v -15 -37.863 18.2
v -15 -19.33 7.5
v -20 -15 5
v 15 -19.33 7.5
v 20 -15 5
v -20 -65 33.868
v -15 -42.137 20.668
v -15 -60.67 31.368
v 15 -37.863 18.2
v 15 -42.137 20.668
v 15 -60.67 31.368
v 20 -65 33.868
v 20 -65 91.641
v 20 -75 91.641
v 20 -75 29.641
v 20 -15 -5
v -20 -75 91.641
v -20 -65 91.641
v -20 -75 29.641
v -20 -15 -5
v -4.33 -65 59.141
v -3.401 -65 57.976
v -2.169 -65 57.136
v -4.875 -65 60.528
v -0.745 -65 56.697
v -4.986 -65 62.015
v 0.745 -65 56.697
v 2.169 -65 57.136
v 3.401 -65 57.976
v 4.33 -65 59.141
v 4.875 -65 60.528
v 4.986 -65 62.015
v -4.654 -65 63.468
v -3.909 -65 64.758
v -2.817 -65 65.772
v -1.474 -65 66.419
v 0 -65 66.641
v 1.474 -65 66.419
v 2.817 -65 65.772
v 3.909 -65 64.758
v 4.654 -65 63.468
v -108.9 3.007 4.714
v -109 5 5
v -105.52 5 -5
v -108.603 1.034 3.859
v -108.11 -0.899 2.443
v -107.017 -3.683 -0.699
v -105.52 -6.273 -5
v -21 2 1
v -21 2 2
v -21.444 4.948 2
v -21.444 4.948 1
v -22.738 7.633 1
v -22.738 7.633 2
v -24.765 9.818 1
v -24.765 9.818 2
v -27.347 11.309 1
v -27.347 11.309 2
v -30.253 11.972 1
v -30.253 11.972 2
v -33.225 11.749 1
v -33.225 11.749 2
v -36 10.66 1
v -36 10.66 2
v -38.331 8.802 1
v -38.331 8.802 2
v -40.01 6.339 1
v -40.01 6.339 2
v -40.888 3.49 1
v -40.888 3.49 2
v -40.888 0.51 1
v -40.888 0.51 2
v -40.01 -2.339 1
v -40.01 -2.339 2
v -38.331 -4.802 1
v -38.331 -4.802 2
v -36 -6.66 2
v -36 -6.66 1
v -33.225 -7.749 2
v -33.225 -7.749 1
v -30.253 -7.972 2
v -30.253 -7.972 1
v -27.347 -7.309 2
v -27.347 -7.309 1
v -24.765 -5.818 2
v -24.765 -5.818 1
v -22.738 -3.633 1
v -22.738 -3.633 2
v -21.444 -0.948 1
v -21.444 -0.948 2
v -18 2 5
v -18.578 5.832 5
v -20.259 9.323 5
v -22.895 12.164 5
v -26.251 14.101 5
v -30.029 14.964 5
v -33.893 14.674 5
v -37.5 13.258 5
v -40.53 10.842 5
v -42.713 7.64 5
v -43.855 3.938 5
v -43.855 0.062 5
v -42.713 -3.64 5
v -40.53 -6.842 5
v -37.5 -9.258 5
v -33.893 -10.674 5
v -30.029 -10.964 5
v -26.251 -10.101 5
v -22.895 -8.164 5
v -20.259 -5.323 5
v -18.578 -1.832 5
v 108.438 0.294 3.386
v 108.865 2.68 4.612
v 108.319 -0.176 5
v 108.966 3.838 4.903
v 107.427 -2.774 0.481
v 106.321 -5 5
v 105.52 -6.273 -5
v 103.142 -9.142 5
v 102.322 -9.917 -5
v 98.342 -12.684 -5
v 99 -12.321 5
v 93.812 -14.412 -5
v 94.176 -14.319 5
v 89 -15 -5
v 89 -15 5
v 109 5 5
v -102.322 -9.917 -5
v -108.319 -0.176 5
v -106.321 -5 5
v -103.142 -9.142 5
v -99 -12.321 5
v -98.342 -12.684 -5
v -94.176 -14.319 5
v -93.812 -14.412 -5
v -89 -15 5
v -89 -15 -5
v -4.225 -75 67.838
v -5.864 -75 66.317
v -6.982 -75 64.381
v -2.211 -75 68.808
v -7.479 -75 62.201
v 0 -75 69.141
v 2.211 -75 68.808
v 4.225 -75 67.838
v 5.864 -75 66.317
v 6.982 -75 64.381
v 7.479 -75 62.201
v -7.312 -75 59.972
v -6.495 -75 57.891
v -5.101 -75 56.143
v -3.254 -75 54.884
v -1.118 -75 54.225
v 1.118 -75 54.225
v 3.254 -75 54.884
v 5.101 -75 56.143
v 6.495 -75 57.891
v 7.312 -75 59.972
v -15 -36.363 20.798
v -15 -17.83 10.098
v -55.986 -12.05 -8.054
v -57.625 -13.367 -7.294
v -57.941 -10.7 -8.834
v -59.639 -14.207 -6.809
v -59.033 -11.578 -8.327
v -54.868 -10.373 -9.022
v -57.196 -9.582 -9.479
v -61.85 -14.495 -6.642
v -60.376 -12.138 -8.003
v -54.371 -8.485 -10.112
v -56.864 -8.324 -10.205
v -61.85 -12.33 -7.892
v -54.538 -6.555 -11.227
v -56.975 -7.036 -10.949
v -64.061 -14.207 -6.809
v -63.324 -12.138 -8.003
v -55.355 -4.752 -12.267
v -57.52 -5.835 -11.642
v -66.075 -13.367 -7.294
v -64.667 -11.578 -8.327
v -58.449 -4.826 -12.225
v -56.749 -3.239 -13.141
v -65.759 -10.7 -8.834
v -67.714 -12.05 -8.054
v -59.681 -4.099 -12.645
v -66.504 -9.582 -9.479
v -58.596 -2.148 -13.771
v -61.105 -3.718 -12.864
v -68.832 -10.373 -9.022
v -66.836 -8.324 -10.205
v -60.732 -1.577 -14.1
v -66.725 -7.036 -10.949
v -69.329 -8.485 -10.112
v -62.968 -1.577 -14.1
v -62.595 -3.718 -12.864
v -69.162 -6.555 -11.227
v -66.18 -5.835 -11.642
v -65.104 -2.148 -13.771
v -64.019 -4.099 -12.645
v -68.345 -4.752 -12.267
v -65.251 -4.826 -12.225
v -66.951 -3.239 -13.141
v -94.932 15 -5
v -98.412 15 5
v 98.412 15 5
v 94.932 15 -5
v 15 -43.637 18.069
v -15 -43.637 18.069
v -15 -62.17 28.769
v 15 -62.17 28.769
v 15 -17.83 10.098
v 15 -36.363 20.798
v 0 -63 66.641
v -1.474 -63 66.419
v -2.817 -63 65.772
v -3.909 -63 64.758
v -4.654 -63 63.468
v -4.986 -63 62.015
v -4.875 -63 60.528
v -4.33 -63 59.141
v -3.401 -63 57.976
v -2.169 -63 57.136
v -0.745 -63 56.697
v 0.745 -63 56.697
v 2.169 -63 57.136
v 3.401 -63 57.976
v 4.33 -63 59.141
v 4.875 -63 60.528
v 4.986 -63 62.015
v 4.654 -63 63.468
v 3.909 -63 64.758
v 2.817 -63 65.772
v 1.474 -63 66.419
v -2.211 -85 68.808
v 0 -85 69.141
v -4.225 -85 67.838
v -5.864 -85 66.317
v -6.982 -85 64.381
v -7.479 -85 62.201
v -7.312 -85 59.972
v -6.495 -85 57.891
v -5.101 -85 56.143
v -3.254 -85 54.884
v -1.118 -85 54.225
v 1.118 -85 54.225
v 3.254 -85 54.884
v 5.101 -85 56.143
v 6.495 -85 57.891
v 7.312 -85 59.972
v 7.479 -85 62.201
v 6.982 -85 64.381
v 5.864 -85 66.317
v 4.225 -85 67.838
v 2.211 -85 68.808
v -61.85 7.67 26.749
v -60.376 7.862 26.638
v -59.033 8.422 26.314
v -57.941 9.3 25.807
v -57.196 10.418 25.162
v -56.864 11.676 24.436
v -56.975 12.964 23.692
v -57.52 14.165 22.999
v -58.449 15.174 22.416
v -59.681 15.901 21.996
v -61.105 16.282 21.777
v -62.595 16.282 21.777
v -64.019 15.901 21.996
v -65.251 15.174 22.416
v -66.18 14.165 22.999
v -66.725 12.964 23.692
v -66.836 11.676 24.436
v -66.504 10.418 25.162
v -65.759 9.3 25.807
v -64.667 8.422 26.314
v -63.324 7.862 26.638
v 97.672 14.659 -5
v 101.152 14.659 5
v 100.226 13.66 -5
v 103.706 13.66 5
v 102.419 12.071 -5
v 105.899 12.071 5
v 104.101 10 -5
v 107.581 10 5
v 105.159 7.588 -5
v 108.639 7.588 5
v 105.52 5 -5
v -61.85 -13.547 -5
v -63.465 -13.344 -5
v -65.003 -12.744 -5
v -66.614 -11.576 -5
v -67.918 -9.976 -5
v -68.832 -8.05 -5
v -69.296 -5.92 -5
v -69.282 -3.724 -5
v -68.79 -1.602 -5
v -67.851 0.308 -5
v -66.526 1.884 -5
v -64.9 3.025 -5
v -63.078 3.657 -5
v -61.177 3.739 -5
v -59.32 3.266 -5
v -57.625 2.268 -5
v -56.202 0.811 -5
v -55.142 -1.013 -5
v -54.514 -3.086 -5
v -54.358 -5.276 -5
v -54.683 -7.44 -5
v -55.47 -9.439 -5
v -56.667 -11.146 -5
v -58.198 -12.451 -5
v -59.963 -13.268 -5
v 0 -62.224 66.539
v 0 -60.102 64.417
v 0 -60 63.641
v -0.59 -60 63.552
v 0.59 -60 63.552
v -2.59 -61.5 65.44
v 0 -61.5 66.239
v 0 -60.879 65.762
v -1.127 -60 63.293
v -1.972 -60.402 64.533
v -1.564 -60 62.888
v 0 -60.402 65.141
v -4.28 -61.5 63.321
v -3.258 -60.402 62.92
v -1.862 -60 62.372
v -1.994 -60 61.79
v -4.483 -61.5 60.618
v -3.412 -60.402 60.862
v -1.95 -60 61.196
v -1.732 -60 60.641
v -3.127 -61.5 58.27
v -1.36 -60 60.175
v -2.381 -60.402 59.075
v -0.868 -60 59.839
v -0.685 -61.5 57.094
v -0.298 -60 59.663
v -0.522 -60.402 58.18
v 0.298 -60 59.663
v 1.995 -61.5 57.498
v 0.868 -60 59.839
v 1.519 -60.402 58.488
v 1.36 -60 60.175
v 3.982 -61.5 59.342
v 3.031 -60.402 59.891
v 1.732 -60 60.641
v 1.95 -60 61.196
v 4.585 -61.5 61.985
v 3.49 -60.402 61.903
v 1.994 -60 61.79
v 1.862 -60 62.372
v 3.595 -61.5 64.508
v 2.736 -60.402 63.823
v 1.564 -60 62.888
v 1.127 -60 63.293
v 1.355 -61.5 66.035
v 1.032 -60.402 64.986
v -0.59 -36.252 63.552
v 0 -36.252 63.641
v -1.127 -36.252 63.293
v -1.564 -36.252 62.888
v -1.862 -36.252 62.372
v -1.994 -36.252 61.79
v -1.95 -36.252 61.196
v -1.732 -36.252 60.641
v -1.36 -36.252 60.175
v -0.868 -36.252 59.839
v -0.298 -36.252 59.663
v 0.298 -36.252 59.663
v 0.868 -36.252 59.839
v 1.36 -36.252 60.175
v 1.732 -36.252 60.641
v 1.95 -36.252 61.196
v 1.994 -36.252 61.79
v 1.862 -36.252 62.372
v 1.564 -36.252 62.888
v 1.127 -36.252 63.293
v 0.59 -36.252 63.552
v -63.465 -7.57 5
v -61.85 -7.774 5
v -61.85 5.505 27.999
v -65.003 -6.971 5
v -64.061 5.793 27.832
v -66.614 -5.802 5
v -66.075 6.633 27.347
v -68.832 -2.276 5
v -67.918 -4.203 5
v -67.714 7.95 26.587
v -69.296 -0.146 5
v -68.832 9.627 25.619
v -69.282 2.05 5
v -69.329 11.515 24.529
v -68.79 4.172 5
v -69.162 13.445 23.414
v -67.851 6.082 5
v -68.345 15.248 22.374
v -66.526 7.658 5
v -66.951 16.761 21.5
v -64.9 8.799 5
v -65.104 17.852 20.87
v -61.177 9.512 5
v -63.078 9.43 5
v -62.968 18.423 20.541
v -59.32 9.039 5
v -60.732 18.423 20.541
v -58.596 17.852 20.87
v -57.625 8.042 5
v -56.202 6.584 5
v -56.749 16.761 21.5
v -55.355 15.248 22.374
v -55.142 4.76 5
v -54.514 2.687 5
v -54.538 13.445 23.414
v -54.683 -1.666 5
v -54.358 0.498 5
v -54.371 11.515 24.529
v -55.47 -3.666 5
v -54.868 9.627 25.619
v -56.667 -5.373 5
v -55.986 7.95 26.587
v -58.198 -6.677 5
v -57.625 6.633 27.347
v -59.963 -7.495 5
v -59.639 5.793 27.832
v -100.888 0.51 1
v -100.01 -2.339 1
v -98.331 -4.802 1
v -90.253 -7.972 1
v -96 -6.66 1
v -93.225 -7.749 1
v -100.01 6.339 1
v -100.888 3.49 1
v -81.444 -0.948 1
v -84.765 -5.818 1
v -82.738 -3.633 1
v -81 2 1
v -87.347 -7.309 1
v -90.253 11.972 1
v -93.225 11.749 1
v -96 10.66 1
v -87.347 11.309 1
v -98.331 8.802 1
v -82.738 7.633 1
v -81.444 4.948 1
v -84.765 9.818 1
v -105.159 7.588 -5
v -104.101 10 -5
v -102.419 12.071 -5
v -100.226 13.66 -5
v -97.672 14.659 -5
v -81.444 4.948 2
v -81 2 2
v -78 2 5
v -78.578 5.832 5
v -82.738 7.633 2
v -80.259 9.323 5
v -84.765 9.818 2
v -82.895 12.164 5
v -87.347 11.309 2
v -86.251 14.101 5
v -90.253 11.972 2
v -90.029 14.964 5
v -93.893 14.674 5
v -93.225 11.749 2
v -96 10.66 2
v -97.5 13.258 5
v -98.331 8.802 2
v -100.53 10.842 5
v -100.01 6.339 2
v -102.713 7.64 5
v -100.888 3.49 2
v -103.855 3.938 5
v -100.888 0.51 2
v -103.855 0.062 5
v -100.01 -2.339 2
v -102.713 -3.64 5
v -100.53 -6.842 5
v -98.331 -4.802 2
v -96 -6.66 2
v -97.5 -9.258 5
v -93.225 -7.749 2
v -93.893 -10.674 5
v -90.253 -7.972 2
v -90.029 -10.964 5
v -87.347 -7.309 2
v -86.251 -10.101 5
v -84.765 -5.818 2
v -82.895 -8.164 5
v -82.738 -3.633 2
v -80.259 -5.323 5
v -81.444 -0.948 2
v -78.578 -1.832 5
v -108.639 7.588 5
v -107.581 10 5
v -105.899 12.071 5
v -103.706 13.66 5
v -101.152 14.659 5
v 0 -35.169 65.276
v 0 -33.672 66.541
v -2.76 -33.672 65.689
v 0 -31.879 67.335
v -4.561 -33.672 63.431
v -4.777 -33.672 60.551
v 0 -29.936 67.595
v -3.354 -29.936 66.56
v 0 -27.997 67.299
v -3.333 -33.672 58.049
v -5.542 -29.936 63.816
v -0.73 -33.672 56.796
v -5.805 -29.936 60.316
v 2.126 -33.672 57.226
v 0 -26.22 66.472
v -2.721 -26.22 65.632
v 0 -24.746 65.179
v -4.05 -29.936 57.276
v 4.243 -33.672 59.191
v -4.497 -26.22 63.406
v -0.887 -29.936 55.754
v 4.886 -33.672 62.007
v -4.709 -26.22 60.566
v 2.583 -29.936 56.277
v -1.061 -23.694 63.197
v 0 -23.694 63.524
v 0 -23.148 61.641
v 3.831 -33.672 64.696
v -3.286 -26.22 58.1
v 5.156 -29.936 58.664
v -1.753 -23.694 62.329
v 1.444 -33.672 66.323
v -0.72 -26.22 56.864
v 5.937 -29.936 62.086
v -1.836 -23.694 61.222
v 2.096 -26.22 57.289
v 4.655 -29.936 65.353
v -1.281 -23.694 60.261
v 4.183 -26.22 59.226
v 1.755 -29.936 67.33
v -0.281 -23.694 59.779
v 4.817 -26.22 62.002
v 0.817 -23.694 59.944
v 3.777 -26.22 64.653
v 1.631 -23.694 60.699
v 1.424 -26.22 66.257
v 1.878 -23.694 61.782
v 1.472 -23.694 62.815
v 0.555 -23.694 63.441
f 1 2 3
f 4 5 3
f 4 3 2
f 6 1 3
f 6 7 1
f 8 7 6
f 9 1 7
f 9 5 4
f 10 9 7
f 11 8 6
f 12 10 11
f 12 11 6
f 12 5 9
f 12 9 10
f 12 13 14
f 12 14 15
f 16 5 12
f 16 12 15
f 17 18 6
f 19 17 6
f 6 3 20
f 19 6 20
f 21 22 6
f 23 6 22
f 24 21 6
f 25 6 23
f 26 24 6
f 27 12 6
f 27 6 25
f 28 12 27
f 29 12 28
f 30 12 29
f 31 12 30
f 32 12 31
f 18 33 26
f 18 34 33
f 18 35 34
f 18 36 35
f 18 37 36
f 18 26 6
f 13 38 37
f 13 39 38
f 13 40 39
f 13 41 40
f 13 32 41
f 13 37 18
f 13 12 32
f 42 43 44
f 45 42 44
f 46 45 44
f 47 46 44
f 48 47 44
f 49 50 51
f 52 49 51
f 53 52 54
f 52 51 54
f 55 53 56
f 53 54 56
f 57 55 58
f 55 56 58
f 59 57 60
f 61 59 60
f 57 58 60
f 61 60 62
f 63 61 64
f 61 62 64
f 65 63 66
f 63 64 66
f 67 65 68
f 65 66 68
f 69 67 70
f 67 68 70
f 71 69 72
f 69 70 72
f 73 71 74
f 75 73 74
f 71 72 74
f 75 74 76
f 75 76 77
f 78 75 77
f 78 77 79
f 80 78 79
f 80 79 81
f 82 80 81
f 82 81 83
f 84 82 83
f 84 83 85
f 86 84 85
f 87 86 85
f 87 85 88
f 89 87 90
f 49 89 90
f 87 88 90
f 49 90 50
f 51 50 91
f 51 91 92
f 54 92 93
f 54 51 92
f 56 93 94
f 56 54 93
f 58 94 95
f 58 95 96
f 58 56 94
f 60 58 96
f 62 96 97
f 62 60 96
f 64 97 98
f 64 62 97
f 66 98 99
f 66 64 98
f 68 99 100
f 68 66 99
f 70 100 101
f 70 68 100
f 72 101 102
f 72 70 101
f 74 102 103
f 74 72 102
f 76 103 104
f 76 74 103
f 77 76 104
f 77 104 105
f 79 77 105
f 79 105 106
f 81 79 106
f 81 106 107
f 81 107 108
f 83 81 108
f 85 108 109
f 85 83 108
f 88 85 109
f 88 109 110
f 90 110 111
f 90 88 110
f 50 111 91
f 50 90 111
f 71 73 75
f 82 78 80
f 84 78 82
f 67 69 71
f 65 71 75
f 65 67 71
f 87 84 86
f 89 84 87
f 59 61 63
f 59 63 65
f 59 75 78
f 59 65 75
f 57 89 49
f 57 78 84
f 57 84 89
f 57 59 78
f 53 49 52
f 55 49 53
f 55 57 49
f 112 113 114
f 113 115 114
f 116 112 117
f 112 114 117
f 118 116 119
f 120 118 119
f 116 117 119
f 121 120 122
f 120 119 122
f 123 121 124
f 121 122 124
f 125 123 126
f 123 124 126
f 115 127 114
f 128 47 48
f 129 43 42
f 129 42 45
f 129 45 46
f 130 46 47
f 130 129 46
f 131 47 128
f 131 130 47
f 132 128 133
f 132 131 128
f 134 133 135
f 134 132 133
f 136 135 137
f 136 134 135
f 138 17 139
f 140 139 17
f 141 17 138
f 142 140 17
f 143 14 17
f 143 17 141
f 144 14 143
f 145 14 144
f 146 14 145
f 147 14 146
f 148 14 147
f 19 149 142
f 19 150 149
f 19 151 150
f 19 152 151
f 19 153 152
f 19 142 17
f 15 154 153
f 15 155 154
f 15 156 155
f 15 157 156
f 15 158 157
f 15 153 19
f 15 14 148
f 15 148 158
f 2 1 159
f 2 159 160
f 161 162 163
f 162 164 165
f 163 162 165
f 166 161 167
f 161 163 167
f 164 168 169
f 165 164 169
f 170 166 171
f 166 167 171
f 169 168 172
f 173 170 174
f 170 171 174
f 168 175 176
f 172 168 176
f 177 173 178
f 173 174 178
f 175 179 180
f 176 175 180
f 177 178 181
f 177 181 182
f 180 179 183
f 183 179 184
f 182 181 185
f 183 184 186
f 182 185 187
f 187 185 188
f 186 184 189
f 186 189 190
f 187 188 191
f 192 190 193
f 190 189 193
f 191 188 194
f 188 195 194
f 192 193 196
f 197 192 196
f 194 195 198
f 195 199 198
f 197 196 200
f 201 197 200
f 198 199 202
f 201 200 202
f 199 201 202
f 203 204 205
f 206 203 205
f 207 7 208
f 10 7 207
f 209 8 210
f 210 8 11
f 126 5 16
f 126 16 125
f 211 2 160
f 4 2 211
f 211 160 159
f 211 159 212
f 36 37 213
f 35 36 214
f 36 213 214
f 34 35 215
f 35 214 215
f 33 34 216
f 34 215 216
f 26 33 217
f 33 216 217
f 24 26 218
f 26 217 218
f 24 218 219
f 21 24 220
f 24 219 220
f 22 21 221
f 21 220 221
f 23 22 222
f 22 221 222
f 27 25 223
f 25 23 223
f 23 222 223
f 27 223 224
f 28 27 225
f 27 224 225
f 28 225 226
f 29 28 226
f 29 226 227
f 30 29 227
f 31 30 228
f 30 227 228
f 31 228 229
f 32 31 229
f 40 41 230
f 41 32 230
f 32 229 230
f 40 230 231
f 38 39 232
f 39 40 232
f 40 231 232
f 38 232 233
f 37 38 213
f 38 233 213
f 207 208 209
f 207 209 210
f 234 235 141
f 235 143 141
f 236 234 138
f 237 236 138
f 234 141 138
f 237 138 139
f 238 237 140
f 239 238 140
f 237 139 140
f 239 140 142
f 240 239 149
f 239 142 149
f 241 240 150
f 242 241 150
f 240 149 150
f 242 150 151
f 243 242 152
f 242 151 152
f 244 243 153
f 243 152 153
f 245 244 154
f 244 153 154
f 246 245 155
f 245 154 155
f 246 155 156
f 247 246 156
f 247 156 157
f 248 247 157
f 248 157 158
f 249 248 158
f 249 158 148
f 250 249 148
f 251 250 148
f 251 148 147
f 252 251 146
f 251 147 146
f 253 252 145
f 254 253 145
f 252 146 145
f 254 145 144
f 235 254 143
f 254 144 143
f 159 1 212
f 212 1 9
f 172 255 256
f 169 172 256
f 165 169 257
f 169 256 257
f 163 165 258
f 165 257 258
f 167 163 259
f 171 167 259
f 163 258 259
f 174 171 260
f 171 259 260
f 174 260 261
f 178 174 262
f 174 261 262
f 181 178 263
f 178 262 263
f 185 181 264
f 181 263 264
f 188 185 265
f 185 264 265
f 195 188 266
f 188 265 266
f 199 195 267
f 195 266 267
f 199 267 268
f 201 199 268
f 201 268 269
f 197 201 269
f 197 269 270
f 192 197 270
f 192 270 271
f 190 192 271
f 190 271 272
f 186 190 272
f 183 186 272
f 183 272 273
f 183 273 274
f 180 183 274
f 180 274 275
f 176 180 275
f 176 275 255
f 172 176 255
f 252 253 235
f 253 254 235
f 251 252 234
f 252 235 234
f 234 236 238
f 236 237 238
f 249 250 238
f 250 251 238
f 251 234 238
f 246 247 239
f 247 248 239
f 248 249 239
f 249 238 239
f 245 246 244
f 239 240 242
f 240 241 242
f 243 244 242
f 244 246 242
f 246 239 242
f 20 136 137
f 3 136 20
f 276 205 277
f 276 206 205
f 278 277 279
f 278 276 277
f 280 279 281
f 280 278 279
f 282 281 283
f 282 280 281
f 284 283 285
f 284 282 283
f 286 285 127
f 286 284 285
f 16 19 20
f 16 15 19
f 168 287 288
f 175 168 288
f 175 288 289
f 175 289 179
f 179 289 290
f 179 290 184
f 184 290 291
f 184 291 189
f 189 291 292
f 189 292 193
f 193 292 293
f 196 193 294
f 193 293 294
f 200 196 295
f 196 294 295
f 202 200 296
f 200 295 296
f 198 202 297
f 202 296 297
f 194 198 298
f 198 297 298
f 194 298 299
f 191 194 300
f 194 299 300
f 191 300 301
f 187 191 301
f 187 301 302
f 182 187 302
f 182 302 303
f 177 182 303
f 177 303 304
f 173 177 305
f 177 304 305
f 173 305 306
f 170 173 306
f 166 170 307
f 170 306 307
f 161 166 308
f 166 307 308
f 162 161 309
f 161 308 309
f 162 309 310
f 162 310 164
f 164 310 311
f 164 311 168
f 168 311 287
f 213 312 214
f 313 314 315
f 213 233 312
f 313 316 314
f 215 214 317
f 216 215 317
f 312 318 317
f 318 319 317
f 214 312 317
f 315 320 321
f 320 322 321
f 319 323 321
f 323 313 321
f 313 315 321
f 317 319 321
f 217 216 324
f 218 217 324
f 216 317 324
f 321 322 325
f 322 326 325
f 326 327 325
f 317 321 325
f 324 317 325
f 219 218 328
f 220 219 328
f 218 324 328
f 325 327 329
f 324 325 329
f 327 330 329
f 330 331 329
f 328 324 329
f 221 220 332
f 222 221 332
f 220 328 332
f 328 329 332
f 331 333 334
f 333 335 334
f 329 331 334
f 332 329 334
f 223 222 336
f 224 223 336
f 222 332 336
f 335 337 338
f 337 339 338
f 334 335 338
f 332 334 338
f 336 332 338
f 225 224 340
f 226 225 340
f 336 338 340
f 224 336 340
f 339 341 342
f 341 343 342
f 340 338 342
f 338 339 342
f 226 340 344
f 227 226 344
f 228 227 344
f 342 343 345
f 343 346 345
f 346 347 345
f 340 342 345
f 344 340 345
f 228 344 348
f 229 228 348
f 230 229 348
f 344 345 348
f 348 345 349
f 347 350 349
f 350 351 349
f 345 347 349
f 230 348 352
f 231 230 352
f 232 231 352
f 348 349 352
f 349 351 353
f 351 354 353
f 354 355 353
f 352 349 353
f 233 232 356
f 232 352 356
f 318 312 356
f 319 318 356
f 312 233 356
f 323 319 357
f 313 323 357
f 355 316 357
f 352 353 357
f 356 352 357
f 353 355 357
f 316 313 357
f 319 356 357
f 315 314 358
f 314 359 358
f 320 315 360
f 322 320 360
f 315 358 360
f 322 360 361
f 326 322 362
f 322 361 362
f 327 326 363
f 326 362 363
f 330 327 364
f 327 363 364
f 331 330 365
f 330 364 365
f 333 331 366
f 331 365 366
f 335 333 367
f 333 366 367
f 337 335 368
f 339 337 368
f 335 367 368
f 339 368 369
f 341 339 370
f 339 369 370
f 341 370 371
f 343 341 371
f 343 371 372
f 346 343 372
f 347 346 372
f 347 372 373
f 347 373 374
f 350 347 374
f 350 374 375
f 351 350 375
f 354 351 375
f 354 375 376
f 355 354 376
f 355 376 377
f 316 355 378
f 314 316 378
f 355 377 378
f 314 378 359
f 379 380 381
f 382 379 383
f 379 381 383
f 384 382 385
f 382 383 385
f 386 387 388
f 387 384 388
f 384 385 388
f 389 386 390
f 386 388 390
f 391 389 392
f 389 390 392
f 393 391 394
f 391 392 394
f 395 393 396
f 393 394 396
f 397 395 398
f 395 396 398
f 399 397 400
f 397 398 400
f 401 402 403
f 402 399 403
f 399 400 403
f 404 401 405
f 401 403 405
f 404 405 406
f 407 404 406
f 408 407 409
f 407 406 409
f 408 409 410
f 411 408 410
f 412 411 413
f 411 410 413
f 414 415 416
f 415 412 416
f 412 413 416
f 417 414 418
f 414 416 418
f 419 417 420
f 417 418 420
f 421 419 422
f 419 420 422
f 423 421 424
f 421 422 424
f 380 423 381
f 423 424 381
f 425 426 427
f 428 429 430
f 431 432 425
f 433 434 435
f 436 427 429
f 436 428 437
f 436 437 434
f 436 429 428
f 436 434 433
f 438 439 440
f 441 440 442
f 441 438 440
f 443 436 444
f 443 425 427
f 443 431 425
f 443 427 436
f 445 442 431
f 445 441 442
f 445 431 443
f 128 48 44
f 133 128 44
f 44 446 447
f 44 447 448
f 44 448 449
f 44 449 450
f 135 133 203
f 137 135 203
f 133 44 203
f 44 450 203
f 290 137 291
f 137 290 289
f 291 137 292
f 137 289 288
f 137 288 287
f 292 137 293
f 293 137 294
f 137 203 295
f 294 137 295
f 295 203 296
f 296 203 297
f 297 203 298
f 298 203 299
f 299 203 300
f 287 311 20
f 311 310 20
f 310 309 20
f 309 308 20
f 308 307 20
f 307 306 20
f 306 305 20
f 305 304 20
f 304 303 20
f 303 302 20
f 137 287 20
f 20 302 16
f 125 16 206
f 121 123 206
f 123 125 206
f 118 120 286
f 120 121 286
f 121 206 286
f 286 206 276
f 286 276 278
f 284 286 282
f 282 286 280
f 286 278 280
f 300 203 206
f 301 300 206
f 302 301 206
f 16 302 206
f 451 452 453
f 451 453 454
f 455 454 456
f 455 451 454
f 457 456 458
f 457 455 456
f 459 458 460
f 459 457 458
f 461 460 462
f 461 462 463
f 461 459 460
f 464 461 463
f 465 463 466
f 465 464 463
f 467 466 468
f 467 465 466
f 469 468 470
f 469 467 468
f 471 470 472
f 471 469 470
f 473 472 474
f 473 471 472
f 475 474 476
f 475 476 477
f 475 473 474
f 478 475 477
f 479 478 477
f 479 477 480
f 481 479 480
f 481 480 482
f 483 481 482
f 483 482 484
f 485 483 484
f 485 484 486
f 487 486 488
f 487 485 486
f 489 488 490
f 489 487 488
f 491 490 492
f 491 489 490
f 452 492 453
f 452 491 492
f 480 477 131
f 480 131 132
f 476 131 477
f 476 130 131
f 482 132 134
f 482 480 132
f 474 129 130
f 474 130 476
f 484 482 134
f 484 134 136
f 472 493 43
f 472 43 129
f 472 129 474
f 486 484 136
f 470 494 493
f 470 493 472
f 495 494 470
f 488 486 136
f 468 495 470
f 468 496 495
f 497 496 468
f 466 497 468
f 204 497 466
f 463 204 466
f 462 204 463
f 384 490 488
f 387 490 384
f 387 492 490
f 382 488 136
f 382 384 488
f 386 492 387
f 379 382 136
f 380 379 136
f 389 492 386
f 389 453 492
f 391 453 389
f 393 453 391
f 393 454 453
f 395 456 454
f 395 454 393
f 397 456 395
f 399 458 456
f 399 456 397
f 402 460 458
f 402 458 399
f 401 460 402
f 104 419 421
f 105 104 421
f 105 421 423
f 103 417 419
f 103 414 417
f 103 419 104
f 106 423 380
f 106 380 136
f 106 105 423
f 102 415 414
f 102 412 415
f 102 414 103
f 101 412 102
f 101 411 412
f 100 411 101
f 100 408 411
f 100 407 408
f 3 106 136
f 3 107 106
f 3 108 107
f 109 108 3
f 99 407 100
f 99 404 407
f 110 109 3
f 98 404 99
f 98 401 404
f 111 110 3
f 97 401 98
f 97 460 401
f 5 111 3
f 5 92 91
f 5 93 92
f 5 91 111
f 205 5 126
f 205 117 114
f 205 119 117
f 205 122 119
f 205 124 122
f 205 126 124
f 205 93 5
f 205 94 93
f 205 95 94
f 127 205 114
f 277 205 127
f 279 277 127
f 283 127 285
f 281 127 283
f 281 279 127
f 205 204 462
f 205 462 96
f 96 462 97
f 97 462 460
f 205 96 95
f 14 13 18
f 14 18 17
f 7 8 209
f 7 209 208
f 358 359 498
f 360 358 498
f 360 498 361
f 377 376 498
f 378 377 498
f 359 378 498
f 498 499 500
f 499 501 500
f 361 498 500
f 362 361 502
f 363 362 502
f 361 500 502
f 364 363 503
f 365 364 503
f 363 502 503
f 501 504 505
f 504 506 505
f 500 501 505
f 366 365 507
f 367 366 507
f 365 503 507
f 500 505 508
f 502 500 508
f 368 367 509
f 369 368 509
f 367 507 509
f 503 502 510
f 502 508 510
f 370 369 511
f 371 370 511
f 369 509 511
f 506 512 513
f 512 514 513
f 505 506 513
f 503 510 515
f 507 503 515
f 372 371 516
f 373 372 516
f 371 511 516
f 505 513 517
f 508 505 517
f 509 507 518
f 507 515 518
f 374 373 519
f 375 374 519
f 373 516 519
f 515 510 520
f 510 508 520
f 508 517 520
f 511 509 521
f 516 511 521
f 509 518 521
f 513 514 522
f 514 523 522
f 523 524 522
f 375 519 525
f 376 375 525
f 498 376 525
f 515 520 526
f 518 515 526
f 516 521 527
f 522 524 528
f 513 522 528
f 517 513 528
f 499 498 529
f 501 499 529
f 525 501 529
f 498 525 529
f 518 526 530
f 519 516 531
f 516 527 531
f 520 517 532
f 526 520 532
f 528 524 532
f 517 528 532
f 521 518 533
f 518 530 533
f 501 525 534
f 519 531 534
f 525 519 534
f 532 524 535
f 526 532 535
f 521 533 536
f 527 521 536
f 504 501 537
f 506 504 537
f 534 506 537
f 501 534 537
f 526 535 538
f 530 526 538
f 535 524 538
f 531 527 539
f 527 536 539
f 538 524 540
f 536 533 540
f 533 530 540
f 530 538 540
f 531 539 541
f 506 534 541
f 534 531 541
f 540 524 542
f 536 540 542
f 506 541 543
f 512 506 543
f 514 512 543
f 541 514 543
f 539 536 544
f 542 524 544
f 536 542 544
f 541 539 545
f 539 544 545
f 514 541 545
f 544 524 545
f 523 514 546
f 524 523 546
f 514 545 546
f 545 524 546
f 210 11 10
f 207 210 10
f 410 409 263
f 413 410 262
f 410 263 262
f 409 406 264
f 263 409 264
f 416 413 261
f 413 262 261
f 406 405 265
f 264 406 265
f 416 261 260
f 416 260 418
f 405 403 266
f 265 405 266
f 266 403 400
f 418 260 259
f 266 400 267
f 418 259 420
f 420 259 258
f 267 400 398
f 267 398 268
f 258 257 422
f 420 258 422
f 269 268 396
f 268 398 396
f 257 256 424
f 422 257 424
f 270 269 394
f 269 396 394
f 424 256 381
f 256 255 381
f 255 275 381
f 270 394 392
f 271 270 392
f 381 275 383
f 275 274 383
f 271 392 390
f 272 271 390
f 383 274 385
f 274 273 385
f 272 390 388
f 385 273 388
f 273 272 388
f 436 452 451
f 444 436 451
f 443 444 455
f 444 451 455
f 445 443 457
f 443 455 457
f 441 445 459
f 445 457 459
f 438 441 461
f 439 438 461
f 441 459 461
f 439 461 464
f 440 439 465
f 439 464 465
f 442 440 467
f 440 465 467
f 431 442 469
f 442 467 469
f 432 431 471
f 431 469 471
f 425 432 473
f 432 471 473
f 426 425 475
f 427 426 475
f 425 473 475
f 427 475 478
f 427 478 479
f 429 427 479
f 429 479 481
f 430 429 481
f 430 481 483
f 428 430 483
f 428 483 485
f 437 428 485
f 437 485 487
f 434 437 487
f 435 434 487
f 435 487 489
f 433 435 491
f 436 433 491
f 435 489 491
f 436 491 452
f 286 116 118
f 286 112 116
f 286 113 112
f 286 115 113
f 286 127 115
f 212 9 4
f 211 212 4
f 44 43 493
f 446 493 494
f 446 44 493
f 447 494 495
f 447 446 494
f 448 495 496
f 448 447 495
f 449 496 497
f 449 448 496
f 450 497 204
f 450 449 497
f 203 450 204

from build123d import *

# Parameters (mm, degrees)
IZIM1_W                     = 218
IZIM1_H                     = 30
Y_KSEKLIK_EKSTR_ZYON1_DEPTH = 5
RADYUS1_R                   = 20
IZIM3_R                     = 10
KES_EKSTR_ZYON1_DEPTH       = 4
PAH1_SIZE                   = 3
IZIM5_R                     = 5
KES_EKSTR_ZYON3_DEPTH       = 119.749210232
Y_KSEKLIK_EKSTR_ZYON2_DEPTH = 20
IZIM9_W                     = 30
IZIM9_H                     = 21.4
Y_KSEKLIK_EKSTR_ZYON3_DEPTH = 3
IZIM9_3_W                   = 30
IZIM9_3_H                   = 21.4
KES_EKSTR_ZYON4_DEPTH       = 3
KES_EKSTR_ZYON5_DEPTH       = 40
RADYUS2_R                   = 10
RADYUS2_OF_AYNALAMA1_R      = 10


with BuildPart() as part:
    # Çizim1 → Yükseklik-Ekstrüzyon1 (new, symmetric)
    with BuildSketch(Plane.XY):
        Rectangle(IZIM1_W, IZIM1_H)
    extrude(amount=Y_KSEKLIK_EKSTR_ZYON1_DEPTH, both=True)

    # Radyus1
    radyus1_edges = [part.edges().sort_by_distance(p)[0] for p in [
        (109, -15, 0),
        (-109, -15, 0),
    ]]
    fillet(radyus1_edges, radius=RADYUS1_R)

    # Çizim3 → Kes-Ekstrüzyon1 (cut)
    with BuildSketch(Plane.XY.offset(5)):
        with Locations((-91, 2)):
            Circle(IZIM3_R)
        with Locations((-31, 2)):
            Circle(IZIM3_R)
    extrude(amount=-KES_EKSTR_ZYON1_DEPTH, mode=Mode.SUBTRACT)

    # Pah1
    pah1_edges = [part.edges().sort_by_distance(p)[0] for p in [
        (-101, 2, 5),
        (-41, 2, 5),
    ]]
    chamfer(pah1_edges, length=PAH1_SIZE - 0.0001)  # a hair under: the kernel refuses the full size

    # Çizim4 → Döndür1 (revolve)
    with BuildSketch(Plane(origin=(-61.85, 0, 0), x_dir=(0, 0, -1), z_dir=(1, 0, 0)), mode=Mode.PRIVATE) as d_nd_r1_sk:
        Polygon((-20.498711306, 18.495190528), (-24.248711306, 12), (10.392304845, -8), (14.142304845, -1.504809472), align=None)
    revolve(d_nd_r1_sk.sketch.rotate(Axis((-61.85, 12, 24.248711306), (0, -0.49999999999999767, -0.86602540378444)), 180), axis=Axis((-61.85, 12, 24.248711306), (0, -0.49999999999999767, -0.86602540378444)))

    # Çizim5 → Kes-Ekstrüzyon3 (cut, through all)
    with BuildSketch(Plane(origin=(0, 13.5, 23.382685902), x_dir=(1, 0, 0), z_dir=(0, 0.4999999999999978, 0.86602540378444))):
        with Locations(Location((-61.85, -1.732050808, 0), (0, 0, 270))):
            Circle(IZIM5_R)
    extrude(amount=-KES_EKSTR_ZYON3_DEPTH, mode=Mode.SUBTRACT)

    # Çizim7 → Yükseklik-Ekstrüzyon2 (add, symmetric)
    with BuildSketch(Plane(origin=(0, 0, 0), x_dir=(0, 0, -1), z_dir=(1, 0, 0))):
        Polygon((5, -15), (-5, -15), (-33.867513459, -65), (-91.641016151, -65), (-91.641016151, -75), (-29.641016151, -75), align=None)
    extrude(amount=Y_KSEKLIK_EKSTR_ZYON2_DEPTH, both=True)

    # Çizim9 → Yükseklik-Ekstrüzyon3 (add)
    with BuildSketch(Plane(origin=(0, -1.584936491, -2.745190528), x_dir=(1, 0, 0), z_dir=(0, 0.4999999999999977, 0.86602540378444))):
        with Locations((0, -31.190381057)):
            Rectangle(IZIM9_W, IZIM9_H)
    extrude(amount=Y_KSEKLIK_EKSTR_ZYON3_DEPTH)

    # Çizim9<3> → Kes-Ekstrüzyon4 (cut)
    with BuildSketch(Plane(origin=(0, -1.584936491, -2.745190528), x_dir=(1, 0, 0), z_dir=(0, 0.4999999999999977, 0.86602540378444))):
        with Locations((0, -57.525407976)):
            Rectangle(IZIM9_3_W, IZIM9_3_H)
    extrude(amount=-KES_EKSTR_ZYON4_DEPTH, mode=Mode.SUBTRACT)

    # Çizim11 → Döndür2 (revolve)
    with BuildSketch(Plane(origin=(0, 0, 0), x_dir=(0, 0, -1), z_dir=(1, 0, 0)), mode=Mode.PRIVATE) as d_nd_r2_sk:
        with BuildLine():
            Line((-61.641016151, -23.147719704), (-61.641016151, -85))
            Line((-61.641016151, -85), (-54.141016151, -85))
            Line((-54.141016151, -85), (-54.141016151, -75))
            Line((-54.141016151, -75), (-56.641016151, -75))
            Line((-56.641016151, -75), (-56.641016151, -63))
            ThreePointArc((-56.641016151, -63), (-57.519695808, -60.878679656), (-59.641016151, -60))
            Line((-59.641016151, -60), (-59.641016151, -36.252262247))
            ThreePointArc((-59.641016151, -36.252262247), (-55.765967633, -28.955966756), (-61.641016151, -23.147719704))
        make_face()
    revolve(d_nd_r2_sk.sketch.rotate(Axis((0, -23.147719704, 61.641016151), (0, -1, 0)), 180), axis=Axis((0, -23.147719704, 61.641016151), (0, -1, 0)))

    # Çizim12 → Kes-Ekstrüzyon5 (cut)
    with BuildSketch(Plane(origin=(0, 15, 0), x_dir=(1, 0, 0), z_dir=(0, 1, 0))):
        Polygon((-109, 5), (-109, -5), (-105.52, 5), align=None)
    kes_ekstr_zyon5 = extrude(amount=-KES_EKSTR_ZYON5_DEPTH, mode=Mode.SUBTRACT)

    # Radyus2
    radyus2_edges = [part.edges().sort_by_distance(p)[0] for p in [
        (-107.26, 15, 0),
    ]]
    fillet(radyus2_edges, radius=RADYUS2_R)

    # Aynalama1: Kes-Ekstrüzyon5 across plane
    add(kes_ekstr_zyon5.mirror(Plane(origin=(0, 0, 0), x_dir=(0, 0, 1), z_dir=(1, 0, 0))), mode=Mode.SUBTRACT)

    # Radyus2 of Aynalama1
    radyus2_of_aynalama1_edges = [part.edges().sort_by_distance(p)[0] for p in [
        (107.26, 15, 0),
    ]]
    fillet(radyus2_of_aynalama1_edges, radius=RADYUS2_OF_AYNALAMA1_R)


solid = part.part
